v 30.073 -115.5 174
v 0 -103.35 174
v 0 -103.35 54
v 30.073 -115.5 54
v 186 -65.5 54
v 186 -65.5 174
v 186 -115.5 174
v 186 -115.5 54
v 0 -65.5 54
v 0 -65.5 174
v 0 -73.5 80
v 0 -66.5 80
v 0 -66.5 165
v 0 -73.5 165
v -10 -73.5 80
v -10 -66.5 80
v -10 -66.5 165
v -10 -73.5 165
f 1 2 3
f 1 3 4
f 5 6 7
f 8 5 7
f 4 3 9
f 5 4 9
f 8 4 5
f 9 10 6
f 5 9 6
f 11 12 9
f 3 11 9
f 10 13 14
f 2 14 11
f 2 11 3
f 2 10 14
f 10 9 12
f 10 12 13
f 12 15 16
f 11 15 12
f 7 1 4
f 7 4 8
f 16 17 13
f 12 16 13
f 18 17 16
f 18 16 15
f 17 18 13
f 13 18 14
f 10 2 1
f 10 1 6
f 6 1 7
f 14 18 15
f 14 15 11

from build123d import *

# Parameters (mm, degrees)
BOX041_W                  = 41
BOX041_H                  = 12
BOX041_DEPTH              = 200
BOX041_PLACEMENT_ANGLE    = 22
BOX_W                     = 186
BOX_H                     = 50
BOX_DEPTH                 = 120
BOX039_W                  = 11
BOX039_H                  = 7
BOX039_DEPTH              = 85
FUSION012_PLACEMENT_ANGLE = 180


with BuildPart() as cube036:
    # Box041 → Box041 (new body)
    with BuildSketch(Plane.XY):
        with Locations((20.5, 6)):
            Rectangle(BOX041_W, BOX041_H)
    extrude(amount=BOX041_DEPTH)


with BuildPart() as cube036_1:
    # Box041 placement: moved
    add(cube036.part.moved(Location((-1.797588, 37.123258, -8))).rotate(Axis((-1.797588, 37.123258, -8), (0, 0, 1)), BOX041_PLACEMENT_ANGLE))


with BuildPart() as cut012:
    # Box → Box (new body)
    with BuildSketch(Plane.XY):
        with Locations((93, 25)):
            Rectangle(BOX_W, BOX_H)
    extrude(amount=BOX_DEPTH)

    # Cut012: cut Cube036
    add(cube036_1.part, mode=Mode.SUBTRACT)


with BuildPart() as lomograflok:
    # Box039 → Box039 (new body)
    with BuildSketch(Plane(origin=(-10, 1, 9), x_dir=(1, 0, 0), z_dir=(0, 0, 1))):
        with Locations((5.5, 3.5)):
            Rectangle(BOX039_W, BOX039_H)
    extrude(amount=BOX039_DEPTH)

    # Fusion012: union Cut012
    add(cut012.part)


with BuildPart() as lomograflok_1:
    # Fusion012 placement: moved
    add(lomograflok.part.moved(Location((0, -65.5, 174))).rotate(Axis((0, -65.5, 174), (1, 0, 0)), FUSION012_PLACEMENT_ANGLE))


solid = lomograflok_1.part
